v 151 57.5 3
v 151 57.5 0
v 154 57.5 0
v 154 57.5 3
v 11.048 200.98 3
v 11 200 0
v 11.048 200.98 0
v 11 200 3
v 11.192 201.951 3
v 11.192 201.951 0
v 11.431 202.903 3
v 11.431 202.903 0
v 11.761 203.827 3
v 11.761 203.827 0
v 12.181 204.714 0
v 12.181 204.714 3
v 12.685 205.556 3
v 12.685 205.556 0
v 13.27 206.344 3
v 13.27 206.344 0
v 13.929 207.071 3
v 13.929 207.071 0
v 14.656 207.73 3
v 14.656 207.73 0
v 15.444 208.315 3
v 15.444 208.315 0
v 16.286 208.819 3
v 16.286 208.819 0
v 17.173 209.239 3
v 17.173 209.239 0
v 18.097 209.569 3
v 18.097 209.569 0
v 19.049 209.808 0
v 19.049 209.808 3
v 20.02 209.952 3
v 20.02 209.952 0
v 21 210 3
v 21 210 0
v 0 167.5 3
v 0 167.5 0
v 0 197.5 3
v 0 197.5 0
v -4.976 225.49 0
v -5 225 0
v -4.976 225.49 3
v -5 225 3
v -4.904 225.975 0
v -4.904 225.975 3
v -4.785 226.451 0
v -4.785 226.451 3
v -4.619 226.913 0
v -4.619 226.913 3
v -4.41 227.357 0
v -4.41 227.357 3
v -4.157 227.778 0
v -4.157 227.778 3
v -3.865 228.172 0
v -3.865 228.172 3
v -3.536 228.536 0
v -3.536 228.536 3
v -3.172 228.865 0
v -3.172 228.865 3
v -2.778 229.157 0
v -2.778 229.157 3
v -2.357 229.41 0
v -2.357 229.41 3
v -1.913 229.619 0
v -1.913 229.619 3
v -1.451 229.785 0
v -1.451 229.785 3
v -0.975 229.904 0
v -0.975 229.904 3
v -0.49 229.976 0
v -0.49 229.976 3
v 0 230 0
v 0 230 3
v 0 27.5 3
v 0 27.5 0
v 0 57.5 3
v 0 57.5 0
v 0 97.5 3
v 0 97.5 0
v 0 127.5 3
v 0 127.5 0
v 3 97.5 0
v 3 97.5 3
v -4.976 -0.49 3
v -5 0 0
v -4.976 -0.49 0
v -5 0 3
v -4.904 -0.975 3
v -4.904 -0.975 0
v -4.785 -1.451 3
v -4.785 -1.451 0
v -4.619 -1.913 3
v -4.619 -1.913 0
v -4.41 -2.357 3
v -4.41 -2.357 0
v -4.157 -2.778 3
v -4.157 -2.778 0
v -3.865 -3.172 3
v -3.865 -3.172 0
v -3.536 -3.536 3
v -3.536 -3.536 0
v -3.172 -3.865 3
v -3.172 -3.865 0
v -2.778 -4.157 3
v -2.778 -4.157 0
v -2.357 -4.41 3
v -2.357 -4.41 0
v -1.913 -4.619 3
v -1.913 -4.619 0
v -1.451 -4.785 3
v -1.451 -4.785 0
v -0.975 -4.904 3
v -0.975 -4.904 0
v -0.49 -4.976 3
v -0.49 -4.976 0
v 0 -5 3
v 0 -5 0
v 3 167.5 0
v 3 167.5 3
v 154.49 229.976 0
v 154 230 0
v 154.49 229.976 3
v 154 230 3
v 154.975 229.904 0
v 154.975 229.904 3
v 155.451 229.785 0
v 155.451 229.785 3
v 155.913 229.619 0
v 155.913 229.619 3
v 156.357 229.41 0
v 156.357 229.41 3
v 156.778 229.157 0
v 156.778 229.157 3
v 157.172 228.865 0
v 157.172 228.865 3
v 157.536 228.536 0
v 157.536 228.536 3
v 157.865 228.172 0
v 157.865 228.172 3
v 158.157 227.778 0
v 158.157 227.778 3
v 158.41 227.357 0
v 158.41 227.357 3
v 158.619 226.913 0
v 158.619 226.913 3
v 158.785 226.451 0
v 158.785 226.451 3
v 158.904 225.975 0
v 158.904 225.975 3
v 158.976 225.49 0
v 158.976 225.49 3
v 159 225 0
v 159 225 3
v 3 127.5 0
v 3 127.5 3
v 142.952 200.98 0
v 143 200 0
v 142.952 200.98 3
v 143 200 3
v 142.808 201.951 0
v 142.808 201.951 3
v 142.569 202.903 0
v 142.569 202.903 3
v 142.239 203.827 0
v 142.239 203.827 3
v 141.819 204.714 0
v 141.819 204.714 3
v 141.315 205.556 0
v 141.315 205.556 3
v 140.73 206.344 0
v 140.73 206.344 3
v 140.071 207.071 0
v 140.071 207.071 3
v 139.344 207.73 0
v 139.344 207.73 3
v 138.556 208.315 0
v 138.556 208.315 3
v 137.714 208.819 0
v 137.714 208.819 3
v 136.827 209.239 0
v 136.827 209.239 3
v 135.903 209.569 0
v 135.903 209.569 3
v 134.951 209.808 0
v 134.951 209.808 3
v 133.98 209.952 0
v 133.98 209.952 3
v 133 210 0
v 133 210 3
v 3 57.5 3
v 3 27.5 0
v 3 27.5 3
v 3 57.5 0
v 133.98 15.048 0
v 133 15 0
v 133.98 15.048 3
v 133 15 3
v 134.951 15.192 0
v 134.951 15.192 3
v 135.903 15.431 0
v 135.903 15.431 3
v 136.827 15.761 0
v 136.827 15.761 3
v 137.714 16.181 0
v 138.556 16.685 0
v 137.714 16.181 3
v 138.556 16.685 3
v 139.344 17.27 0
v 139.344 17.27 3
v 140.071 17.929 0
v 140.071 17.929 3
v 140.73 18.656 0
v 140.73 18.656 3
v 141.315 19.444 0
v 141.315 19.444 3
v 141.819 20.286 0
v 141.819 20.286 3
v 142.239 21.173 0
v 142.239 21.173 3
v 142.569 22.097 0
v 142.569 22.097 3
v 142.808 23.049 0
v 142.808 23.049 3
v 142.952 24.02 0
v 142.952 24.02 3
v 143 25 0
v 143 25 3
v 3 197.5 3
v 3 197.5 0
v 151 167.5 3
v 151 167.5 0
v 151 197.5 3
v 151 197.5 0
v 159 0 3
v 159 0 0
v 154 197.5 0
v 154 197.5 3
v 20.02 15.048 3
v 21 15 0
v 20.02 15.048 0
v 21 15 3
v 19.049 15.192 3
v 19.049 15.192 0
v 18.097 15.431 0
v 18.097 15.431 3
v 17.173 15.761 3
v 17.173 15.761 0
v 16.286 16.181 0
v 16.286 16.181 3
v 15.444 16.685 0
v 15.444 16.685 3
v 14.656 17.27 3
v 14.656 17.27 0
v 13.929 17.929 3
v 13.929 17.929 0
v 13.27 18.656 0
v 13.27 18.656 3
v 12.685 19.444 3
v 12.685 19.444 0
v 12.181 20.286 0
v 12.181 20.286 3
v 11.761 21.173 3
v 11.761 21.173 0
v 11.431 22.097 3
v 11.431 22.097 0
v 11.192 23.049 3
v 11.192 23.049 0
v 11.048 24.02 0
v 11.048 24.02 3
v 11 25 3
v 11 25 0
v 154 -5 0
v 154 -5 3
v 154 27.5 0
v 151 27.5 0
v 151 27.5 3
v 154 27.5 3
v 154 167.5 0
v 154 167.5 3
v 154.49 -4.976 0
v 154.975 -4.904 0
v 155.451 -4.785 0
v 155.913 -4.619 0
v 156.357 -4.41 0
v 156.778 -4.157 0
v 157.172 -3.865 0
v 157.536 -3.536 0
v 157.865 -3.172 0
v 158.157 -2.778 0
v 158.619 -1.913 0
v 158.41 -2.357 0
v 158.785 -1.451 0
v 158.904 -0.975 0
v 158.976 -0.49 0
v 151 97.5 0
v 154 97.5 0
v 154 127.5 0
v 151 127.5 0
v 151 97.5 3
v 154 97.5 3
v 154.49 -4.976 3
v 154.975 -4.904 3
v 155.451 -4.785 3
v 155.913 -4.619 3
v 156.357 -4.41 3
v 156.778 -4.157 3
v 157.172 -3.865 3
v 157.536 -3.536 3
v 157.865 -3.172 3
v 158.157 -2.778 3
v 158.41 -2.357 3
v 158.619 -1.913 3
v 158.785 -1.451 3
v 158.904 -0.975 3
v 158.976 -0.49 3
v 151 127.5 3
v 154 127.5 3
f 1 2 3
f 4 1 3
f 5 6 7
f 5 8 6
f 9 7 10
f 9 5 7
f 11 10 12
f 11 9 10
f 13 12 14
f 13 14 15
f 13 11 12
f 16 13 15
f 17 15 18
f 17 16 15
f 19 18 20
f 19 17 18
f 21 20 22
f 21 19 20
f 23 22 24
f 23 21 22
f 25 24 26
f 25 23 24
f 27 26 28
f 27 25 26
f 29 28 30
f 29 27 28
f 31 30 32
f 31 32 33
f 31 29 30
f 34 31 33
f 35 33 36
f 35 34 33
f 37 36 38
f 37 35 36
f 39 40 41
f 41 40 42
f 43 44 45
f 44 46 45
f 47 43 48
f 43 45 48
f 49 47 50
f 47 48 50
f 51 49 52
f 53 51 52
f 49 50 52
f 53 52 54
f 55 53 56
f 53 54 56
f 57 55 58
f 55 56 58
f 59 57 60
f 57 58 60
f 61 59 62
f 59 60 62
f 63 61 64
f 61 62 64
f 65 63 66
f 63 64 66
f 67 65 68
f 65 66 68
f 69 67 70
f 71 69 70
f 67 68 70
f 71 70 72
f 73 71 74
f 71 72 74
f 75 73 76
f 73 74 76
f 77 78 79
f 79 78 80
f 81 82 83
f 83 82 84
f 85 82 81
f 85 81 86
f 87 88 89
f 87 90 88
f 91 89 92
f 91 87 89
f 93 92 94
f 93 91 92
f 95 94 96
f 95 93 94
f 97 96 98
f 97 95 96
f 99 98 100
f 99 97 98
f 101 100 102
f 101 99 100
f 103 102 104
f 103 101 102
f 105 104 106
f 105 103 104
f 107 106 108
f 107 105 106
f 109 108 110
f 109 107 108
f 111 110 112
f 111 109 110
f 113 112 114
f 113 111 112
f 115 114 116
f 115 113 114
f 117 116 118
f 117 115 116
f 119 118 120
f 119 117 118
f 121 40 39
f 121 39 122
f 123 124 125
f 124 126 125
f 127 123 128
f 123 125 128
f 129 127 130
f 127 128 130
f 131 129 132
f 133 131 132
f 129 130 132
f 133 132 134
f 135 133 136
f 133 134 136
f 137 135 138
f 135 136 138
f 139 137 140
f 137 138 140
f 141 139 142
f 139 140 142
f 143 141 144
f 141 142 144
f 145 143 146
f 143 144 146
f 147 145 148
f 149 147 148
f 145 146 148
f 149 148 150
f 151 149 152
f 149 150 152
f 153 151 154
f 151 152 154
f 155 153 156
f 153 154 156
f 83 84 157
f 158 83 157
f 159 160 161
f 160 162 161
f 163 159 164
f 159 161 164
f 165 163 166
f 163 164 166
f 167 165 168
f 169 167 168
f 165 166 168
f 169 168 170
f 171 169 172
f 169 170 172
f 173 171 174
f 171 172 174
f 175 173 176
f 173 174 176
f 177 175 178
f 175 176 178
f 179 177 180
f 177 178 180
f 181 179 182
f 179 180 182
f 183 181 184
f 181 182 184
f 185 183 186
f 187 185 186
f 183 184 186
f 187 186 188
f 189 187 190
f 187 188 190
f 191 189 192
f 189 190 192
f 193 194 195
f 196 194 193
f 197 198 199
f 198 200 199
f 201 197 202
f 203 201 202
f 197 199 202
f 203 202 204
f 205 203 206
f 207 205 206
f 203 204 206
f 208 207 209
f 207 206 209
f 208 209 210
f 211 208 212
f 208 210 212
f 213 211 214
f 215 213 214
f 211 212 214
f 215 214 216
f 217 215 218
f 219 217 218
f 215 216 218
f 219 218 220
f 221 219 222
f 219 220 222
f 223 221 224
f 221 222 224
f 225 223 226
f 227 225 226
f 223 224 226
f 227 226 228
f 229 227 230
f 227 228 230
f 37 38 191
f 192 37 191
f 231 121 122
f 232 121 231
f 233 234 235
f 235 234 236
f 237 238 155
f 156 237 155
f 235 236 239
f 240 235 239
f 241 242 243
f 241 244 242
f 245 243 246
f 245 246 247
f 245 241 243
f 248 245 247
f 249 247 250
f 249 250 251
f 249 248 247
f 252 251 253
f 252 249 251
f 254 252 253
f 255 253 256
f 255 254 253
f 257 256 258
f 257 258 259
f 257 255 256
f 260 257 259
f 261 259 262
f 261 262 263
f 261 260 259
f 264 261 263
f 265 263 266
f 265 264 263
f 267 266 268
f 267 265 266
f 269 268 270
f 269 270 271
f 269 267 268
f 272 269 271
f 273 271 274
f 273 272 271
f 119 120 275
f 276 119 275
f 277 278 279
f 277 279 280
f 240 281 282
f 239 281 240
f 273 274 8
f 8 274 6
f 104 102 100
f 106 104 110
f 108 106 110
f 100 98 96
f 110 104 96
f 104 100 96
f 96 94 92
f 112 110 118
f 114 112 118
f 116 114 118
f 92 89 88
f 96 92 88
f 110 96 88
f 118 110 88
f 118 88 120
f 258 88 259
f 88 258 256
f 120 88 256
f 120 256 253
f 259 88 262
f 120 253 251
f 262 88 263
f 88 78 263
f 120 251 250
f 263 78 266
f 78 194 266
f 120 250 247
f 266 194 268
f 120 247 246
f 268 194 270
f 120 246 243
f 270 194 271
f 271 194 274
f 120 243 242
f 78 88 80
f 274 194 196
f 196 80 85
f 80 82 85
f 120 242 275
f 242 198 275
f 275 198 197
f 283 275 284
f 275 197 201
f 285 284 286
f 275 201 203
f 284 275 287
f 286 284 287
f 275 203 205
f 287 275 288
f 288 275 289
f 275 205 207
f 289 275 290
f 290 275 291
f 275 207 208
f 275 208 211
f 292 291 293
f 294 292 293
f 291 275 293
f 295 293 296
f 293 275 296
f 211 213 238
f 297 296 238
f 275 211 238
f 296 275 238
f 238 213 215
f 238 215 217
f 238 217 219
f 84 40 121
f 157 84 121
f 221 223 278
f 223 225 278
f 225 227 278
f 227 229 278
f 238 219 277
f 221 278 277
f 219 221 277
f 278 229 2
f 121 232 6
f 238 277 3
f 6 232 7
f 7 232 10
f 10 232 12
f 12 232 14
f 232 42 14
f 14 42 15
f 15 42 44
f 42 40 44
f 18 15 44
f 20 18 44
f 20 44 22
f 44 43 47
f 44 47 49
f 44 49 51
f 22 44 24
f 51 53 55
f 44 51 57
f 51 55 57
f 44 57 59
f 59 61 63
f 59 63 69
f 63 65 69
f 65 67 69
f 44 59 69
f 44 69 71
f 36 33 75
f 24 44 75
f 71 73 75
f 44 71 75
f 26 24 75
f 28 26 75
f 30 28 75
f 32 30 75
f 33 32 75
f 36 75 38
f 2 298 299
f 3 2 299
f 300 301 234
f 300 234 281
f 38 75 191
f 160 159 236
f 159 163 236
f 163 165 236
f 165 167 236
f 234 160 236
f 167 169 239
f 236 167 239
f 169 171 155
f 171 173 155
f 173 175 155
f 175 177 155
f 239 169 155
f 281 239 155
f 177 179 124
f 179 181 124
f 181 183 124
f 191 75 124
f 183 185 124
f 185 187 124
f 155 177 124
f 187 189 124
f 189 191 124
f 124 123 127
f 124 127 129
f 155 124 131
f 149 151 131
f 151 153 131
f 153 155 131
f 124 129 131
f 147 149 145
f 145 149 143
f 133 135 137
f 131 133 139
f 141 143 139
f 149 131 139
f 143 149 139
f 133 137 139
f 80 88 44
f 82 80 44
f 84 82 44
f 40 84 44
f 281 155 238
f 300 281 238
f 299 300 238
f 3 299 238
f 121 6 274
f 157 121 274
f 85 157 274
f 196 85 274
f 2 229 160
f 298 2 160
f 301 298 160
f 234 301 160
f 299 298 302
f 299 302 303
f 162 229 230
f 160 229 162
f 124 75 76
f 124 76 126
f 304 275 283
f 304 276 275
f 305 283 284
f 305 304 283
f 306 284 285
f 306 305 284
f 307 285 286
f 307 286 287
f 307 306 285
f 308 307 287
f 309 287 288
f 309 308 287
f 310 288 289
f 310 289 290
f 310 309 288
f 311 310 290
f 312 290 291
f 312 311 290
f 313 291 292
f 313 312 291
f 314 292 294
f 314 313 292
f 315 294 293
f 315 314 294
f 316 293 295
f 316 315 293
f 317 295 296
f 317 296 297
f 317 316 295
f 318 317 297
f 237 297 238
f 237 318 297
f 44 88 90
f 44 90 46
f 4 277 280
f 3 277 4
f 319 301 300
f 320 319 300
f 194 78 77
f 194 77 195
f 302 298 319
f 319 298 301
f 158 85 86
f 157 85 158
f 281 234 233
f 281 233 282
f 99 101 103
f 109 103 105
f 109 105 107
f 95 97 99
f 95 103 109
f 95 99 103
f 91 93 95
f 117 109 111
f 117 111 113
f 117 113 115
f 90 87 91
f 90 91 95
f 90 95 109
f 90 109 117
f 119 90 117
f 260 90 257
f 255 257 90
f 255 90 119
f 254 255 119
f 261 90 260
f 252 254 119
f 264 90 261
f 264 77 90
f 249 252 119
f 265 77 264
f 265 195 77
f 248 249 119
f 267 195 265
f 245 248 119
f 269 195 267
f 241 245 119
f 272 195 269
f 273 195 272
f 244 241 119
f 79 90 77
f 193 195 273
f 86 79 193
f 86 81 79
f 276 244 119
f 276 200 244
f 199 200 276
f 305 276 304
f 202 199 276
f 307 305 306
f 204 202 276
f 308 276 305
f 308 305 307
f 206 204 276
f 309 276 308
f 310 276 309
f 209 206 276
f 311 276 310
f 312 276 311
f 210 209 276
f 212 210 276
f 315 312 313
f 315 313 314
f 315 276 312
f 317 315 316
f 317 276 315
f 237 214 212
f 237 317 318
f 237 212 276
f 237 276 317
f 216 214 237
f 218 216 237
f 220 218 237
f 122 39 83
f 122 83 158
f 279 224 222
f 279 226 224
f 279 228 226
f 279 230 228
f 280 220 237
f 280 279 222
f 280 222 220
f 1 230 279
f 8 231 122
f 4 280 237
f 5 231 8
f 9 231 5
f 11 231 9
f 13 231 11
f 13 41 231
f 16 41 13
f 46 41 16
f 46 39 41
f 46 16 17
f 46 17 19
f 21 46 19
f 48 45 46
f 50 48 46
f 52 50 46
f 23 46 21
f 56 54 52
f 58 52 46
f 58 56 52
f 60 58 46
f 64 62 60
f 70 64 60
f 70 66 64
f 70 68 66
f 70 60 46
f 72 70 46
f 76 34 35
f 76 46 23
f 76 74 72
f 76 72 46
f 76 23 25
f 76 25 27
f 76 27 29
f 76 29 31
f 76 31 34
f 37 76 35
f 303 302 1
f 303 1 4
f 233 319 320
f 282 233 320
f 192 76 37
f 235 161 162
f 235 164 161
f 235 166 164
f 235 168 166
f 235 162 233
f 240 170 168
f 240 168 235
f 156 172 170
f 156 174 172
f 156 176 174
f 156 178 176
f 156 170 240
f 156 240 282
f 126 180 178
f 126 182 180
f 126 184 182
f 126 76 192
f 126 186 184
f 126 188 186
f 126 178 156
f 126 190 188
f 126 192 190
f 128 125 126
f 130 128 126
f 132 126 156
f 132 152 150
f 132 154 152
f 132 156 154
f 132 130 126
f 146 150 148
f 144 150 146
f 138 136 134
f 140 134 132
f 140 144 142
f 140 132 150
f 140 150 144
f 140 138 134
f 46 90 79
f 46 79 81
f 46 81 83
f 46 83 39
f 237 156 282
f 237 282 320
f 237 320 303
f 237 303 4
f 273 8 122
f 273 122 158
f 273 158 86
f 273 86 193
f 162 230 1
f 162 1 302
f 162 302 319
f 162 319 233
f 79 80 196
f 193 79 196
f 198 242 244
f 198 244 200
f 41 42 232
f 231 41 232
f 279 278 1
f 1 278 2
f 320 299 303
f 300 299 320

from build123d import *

# Parameters (mm, degrees)
F0_W     = 164
F0_H     = 235
F0_W_2   = 3
F0_H_2   = 30
F0_W_3   = 132
F0_H_3   = 195
F1_DEPTH = 3
F2_R     = 5
F3_R     = 10


with BuildPart() as f1:
    # F0 (on Top) → F1 (new body)
    with BuildSketch(Plane.XY):
        with Locations((77, 112.5)):
            Rectangle(F0_W, F0_H)
        with Locations((1.5, 42.5)):
            Rectangle(F0_W_2, F0_H_2, mode=Mode.SUBTRACT)
        with Locations((152.5, 42.5)):
            Rectangle(F0_W_2, F0_H_2, mode=Mode.SUBTRACT)
        with Locations((1.5, 112.5)):
            Rectangle(F0_W_2, F0_H_2, mode=Mode.SUBTRACT)
        with Locations((1.5, 182.5)):
            Rectangle(F0_W_2, F0_H_2, mode=Mode.SUBTRACT)
        with Locations((77, 112.5)):
            Rectangle(F0_W_3, F0_H_3, mode=Mode.SUBTRACT)
        with Locations((152.5, 112.5)):
            Rectangle(F0_W_2, F0_H_2, mode=Mode.SUBTRACT)
        with Locations((152.5, 182.5)):
            Rectangle(F0_W_2, F0_H_2, mode=Mode.SUBTRACT)
    extrude(amount=F1_DEPTH)

    # F2
    f2_edges = [f1.edges().sort_by_distance(p)[0] for p in [
        (-5, 230, 1.5),
        (159, 230, 1.5),
        (159, -5, 1.5),
        (-5, -5, 1.5),
    ]]
    fillet(f2_edges, radius=F2_R)

    # F3
    f3_edges = [f1.edges().sort_by_distance(p)[0] for p in [
        (11, 210, 1.5),
        (143, 210, 1.5),
        (143, 15, 1.5),
        (11, 15, 1.5),
    ]]
    fillet(f3_edges, radius=F3_R)


solid = f1.part
